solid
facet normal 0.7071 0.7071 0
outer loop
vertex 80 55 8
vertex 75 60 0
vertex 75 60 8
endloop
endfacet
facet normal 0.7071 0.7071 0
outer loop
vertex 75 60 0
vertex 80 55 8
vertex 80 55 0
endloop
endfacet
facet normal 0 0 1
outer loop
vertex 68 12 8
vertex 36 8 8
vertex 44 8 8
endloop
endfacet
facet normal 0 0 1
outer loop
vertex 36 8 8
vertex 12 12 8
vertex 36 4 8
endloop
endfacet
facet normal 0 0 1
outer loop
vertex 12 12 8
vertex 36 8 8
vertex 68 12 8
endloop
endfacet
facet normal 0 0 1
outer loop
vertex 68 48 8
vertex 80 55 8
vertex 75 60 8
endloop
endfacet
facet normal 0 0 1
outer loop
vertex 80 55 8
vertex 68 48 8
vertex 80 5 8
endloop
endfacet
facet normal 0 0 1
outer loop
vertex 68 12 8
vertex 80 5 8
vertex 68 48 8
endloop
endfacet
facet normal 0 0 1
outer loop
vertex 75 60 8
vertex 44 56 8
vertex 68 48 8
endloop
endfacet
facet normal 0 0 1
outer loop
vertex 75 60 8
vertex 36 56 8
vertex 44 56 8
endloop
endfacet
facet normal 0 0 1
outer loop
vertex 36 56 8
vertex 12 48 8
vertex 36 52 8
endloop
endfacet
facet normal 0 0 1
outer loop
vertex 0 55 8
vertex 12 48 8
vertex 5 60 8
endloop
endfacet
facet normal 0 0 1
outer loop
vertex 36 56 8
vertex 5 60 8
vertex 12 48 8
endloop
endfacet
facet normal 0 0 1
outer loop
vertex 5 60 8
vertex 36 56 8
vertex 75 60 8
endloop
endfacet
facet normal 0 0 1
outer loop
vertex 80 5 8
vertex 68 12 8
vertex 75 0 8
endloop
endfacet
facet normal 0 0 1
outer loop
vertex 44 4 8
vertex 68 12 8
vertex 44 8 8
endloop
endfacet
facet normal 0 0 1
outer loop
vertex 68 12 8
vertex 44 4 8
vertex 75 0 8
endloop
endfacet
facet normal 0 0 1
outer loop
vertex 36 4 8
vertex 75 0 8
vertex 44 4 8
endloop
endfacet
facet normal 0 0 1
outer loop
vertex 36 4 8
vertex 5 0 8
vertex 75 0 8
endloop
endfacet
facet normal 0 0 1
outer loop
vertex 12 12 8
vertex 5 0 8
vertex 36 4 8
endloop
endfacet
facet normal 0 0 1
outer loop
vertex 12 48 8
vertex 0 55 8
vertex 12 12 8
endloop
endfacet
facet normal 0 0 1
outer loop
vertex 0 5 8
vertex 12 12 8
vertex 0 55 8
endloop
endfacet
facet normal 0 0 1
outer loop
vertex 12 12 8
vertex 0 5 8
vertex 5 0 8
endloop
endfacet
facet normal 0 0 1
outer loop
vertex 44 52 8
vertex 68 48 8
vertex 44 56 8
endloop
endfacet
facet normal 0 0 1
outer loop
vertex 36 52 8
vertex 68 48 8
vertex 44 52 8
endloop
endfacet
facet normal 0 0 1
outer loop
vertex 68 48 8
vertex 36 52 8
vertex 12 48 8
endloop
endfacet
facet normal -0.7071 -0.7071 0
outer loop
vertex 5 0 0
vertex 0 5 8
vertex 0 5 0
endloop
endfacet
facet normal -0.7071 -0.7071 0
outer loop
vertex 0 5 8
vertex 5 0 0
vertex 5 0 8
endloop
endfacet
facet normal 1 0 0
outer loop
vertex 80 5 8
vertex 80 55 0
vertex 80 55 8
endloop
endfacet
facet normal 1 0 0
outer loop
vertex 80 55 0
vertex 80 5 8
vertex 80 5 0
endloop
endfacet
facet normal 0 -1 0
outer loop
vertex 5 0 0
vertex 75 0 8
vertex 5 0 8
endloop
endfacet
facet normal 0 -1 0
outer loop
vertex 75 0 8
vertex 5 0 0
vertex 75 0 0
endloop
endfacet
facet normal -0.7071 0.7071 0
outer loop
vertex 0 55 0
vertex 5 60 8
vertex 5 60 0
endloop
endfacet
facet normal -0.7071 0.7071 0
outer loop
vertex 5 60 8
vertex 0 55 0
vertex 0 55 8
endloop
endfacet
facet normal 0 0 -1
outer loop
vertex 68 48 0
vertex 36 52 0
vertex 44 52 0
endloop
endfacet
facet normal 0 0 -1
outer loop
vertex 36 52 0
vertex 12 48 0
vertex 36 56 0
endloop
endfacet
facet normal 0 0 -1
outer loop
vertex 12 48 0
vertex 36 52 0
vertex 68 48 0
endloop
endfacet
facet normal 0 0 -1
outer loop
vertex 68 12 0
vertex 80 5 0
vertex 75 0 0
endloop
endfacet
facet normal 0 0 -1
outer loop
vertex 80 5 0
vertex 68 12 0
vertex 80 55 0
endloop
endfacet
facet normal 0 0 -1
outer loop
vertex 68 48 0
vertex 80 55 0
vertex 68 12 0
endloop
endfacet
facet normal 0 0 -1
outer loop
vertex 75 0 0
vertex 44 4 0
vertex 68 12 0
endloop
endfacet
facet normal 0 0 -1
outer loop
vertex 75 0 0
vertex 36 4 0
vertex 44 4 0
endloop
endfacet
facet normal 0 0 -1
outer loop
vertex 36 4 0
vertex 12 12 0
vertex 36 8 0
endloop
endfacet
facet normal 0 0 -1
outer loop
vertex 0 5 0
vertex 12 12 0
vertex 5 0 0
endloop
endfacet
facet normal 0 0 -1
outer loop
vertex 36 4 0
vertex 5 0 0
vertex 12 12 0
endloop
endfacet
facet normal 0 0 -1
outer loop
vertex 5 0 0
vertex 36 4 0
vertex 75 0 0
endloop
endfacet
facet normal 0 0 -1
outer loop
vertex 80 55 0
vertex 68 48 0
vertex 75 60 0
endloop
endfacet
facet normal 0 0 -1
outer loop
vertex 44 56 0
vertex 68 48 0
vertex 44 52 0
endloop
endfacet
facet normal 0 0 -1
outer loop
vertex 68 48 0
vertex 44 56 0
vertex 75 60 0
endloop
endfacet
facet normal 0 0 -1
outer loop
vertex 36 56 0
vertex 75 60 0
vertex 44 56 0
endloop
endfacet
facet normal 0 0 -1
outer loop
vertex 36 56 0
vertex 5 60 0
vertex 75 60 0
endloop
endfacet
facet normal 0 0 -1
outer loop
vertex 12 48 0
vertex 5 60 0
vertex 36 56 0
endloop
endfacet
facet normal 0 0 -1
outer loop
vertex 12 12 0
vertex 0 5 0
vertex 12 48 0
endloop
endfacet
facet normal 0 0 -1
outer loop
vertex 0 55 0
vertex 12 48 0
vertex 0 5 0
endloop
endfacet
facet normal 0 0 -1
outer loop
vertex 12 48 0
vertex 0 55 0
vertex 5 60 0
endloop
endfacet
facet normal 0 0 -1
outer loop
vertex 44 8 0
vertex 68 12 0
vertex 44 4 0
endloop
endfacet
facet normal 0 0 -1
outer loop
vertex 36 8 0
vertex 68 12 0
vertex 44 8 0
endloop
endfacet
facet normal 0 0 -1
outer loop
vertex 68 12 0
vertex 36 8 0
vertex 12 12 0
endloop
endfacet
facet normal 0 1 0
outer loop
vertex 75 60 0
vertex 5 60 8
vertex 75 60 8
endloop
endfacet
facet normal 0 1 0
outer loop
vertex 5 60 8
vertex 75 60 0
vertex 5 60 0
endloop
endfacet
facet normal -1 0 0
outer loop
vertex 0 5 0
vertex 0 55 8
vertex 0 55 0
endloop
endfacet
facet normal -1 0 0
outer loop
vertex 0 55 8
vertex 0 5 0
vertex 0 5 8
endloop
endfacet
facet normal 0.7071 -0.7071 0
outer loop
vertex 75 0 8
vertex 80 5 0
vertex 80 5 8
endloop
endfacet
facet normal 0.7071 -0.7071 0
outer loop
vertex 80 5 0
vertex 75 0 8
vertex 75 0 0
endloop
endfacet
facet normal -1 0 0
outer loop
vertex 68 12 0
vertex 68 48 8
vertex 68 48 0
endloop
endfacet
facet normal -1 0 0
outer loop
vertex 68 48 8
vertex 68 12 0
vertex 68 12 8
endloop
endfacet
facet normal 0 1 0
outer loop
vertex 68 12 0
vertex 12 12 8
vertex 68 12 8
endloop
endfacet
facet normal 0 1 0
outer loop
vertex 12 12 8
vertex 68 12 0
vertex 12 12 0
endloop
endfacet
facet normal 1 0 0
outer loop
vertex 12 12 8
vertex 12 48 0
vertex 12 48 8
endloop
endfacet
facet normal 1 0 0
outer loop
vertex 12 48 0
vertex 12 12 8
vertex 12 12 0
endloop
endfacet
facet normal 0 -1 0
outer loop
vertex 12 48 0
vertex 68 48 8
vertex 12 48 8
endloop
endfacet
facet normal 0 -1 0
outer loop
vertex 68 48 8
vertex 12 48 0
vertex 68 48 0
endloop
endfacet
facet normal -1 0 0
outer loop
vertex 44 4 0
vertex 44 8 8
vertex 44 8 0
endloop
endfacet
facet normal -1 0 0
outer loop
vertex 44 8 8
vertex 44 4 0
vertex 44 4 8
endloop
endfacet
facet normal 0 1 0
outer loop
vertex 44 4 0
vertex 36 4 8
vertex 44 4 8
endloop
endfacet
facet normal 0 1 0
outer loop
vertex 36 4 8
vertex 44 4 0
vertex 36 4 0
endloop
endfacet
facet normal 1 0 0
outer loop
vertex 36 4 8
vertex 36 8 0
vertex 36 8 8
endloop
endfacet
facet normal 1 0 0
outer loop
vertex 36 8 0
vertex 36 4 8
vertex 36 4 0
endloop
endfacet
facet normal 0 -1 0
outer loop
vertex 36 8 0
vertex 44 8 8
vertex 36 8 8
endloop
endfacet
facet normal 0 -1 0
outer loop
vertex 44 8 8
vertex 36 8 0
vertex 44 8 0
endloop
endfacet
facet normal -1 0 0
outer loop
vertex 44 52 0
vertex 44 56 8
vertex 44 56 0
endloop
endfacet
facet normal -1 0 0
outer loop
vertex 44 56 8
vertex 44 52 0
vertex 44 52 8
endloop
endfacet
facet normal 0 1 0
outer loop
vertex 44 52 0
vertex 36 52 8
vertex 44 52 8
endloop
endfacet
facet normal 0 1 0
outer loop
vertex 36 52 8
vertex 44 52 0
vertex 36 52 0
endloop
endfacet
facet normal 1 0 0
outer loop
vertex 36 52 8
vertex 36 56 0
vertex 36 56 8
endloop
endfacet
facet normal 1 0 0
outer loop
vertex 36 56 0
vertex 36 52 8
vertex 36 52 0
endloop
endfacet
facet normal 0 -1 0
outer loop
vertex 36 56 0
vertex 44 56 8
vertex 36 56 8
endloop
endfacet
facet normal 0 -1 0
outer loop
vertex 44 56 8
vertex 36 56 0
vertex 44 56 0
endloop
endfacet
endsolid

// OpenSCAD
$fn = 32;

// ----------------------------------------------------------------------
// Frame plate: 80 x 60 frame, 12 mm rails
// ----------------------------------------------------------------------

// --- parameters (mm) ---
plate_l = 80;             // plate length, X
plate_w = 60;             // plate width, Y
plate_t = 8;              // plate thickness, Z (extrusion height)
corner_c = 5;             // corner chamfer
frame_bar = 12;           // frame rail width
slot_l = 8;               // adjustment slot length
slot_w = 4;               // adjustment slot width

win_l = plate_l - 2 * frame_bar;  // window length
win_w = plate_w - 2 * frame_bar;  // window width

profile = [[5, 0], [75, 0], [80, 5], [80, 55], [75, 60], [5, 60], [0, 55], [0, 5]];  // primary outline, 8 points, counter clockwise
void_1 = [[12, 12], [68, 12], [68, 48], [12, 48]];  // the window, 4 points
void_2 = [[36, 4], [44, 4], [44, 8], [36, 8]];  // adjustment slot, 4 points
void_3 = [[36, 52], [44, 52], [44, 56], [36, 56]];  // adjustment slot, 4 points

// --- the one profile operation ---
difference() {
  linear_extrude(height = plate_t) polygon(points = profile);
  translate([0, 0, -1])
    linear_extrude(height = plate_t + 2) polygon(points = void_1);
  translate([0, 0, -1])
    linear_extrude(height = plate_t + 2) polygon(points = void_2);
  translate([0, 0, -1])
    linear_extrude(height = plate_t + 2) polygon(points = void_3);
}
